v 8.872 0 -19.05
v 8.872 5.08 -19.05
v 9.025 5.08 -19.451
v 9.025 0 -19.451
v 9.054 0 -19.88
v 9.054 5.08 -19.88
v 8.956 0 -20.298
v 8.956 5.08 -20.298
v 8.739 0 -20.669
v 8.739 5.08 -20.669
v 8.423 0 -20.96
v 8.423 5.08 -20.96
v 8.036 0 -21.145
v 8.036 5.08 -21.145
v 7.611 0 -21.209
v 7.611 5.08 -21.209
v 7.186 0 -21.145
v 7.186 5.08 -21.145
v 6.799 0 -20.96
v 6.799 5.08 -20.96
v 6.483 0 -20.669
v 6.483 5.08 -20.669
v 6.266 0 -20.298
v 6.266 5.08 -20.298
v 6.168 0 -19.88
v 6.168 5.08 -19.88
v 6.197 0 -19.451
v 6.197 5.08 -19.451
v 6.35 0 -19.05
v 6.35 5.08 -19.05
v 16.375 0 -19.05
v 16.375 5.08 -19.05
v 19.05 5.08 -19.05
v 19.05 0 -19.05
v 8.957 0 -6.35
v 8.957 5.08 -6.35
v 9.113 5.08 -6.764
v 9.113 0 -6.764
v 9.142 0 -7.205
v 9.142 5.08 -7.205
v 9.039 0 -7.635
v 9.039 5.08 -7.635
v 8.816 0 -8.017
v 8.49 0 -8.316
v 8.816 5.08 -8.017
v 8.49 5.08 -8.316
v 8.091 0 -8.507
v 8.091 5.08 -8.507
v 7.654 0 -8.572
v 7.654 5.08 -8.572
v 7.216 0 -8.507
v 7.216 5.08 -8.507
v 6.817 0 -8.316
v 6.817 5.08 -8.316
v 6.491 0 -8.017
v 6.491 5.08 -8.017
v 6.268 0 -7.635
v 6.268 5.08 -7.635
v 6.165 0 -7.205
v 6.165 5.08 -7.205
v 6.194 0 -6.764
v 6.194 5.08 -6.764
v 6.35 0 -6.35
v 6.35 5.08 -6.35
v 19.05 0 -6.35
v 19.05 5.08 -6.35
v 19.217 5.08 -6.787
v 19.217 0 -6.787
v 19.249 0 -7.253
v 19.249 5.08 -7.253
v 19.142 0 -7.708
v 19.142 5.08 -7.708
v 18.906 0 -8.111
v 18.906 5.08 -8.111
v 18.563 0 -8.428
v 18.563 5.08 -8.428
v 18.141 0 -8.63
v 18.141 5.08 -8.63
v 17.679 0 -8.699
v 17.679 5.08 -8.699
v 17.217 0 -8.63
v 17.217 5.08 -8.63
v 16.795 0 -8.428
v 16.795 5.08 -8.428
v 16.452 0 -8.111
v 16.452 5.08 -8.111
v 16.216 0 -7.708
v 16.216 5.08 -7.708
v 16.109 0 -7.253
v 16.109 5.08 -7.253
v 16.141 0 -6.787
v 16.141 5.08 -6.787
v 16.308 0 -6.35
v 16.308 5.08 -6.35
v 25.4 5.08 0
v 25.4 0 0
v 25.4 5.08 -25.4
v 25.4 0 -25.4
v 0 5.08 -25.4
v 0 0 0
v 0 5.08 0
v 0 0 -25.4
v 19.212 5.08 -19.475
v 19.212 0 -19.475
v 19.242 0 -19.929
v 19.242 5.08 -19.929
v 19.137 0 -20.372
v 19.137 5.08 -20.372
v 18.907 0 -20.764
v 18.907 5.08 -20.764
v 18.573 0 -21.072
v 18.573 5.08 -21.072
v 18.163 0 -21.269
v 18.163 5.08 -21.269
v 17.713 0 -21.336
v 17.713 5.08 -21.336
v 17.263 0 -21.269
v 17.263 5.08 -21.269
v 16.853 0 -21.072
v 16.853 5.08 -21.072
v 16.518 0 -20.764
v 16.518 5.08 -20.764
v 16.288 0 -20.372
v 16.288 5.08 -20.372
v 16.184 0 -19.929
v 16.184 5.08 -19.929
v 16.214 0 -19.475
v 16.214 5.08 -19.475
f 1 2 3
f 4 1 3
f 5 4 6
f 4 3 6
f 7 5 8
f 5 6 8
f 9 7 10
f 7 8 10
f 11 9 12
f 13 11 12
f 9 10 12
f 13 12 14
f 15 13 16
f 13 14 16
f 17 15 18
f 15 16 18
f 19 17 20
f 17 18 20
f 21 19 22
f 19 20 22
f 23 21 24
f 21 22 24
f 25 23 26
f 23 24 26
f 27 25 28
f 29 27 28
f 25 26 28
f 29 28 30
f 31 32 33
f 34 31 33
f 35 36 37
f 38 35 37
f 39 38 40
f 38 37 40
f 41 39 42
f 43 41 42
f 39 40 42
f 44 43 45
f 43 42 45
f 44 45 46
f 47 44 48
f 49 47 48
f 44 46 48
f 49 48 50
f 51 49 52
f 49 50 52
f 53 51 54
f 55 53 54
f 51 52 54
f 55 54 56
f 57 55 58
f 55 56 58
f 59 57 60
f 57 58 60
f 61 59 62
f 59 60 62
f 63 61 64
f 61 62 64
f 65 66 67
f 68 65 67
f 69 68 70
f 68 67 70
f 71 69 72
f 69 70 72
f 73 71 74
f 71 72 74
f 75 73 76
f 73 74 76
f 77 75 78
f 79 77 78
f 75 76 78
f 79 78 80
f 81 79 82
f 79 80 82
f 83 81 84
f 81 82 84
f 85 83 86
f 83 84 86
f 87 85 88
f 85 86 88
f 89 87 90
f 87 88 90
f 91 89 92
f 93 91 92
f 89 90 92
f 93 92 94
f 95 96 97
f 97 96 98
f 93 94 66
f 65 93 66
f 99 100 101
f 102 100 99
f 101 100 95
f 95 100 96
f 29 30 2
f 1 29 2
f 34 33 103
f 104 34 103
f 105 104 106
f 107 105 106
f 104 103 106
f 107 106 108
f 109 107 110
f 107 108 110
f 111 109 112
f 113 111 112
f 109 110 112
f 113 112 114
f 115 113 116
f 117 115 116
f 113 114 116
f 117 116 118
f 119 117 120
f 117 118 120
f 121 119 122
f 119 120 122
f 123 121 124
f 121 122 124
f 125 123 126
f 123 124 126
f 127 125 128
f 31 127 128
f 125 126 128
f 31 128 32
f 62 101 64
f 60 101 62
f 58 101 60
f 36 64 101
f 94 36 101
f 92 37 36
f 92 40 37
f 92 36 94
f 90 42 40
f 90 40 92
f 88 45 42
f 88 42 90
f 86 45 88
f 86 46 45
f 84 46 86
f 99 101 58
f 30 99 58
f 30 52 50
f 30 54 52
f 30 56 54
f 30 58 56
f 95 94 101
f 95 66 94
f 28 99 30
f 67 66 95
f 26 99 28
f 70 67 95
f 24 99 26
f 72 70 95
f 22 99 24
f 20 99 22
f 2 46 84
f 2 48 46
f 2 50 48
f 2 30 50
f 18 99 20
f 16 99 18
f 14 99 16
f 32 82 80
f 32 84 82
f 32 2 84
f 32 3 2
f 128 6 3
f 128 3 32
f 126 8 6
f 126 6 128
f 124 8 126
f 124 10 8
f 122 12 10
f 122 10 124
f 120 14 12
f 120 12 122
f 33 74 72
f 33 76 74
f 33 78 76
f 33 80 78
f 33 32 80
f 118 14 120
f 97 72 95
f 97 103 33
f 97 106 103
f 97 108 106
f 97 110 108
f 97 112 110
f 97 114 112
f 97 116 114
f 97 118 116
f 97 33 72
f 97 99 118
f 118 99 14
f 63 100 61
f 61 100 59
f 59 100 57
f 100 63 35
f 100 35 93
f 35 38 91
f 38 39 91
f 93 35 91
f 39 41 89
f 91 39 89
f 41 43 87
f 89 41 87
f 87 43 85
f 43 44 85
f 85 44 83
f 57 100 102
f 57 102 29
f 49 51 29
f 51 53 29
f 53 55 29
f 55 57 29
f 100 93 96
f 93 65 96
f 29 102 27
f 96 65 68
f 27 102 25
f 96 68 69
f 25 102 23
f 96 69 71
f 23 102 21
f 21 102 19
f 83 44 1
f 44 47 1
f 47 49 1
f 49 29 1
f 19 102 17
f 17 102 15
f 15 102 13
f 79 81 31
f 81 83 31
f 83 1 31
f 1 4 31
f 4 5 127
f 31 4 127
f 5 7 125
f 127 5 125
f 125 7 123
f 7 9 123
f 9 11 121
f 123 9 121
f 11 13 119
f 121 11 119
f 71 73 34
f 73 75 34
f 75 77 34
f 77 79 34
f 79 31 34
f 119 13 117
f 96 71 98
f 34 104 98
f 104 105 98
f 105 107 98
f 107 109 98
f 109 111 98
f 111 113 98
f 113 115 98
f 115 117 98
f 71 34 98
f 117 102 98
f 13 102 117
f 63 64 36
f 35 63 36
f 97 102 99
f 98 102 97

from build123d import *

# Parameters (mm, degrees)
SKETCH2_W           = 25.4
SKETCH2_H           = 25.4
BOSS_EXTRUDE1_DEPTH = 5.08
CUT_EXTRUDE1_DEPTH  = 5.08


with BuildPart() as part:
    # Sketch2 → Boss-Extrude1 (new body)
    with BuildSketch(Plane(origin=(0, 0, 0), x_dir=(1, 0, 0), z_dir=(0, 1, 0))):
        with Locations((12.7, 12.7)):
            Rectangle(SKETCH2_W, SKETCH2_H)
    extrude(amount=BOSS_EXTRUDE1_DEPTH)

    # Sketch3 → Cut-Extrude1 (cut)
    with BuildSketch(Plane(origin=(0, 5.08, 5.08), x_dir=(1, 0, 0), z_dir=(0, 1, 0))):
        with BuildLine():
            Line((6.35, 11.43), (8.957059761, 11.43))
            ThreePointArc((8.957059761, 11.43), (7.653529881, 13.6525), (6.35, 11.43))
        make_face()
        with BuildLine():
            Line((16.307858538, 11.43), (19.05, 11.43))
            ThreePointArc((19.05, 11.43), (17.678929269, 13.7795), (16.307858538, 11.43))
        make_face()
        with BuildLine():
            Line((6.35, 24.13), (8.872157331, 24.13))
            ThreePointArc((8.872157331, 24.13), (7.611078665, 26.289), (6.35, 24.13))
        make_face()
        with BuildLine():
            Line((16.375390855, 24.13), (19.05, 24.13))
            ThreePointArc((19.05, 24.13), (17.712695427, 26.416), (16.375390855, 24.13))
        make_face()
    extrude(amount=-CUT_EXTRUDE1_DEPTH, mode=Mode.SUBTRACT)


solid = part.part
